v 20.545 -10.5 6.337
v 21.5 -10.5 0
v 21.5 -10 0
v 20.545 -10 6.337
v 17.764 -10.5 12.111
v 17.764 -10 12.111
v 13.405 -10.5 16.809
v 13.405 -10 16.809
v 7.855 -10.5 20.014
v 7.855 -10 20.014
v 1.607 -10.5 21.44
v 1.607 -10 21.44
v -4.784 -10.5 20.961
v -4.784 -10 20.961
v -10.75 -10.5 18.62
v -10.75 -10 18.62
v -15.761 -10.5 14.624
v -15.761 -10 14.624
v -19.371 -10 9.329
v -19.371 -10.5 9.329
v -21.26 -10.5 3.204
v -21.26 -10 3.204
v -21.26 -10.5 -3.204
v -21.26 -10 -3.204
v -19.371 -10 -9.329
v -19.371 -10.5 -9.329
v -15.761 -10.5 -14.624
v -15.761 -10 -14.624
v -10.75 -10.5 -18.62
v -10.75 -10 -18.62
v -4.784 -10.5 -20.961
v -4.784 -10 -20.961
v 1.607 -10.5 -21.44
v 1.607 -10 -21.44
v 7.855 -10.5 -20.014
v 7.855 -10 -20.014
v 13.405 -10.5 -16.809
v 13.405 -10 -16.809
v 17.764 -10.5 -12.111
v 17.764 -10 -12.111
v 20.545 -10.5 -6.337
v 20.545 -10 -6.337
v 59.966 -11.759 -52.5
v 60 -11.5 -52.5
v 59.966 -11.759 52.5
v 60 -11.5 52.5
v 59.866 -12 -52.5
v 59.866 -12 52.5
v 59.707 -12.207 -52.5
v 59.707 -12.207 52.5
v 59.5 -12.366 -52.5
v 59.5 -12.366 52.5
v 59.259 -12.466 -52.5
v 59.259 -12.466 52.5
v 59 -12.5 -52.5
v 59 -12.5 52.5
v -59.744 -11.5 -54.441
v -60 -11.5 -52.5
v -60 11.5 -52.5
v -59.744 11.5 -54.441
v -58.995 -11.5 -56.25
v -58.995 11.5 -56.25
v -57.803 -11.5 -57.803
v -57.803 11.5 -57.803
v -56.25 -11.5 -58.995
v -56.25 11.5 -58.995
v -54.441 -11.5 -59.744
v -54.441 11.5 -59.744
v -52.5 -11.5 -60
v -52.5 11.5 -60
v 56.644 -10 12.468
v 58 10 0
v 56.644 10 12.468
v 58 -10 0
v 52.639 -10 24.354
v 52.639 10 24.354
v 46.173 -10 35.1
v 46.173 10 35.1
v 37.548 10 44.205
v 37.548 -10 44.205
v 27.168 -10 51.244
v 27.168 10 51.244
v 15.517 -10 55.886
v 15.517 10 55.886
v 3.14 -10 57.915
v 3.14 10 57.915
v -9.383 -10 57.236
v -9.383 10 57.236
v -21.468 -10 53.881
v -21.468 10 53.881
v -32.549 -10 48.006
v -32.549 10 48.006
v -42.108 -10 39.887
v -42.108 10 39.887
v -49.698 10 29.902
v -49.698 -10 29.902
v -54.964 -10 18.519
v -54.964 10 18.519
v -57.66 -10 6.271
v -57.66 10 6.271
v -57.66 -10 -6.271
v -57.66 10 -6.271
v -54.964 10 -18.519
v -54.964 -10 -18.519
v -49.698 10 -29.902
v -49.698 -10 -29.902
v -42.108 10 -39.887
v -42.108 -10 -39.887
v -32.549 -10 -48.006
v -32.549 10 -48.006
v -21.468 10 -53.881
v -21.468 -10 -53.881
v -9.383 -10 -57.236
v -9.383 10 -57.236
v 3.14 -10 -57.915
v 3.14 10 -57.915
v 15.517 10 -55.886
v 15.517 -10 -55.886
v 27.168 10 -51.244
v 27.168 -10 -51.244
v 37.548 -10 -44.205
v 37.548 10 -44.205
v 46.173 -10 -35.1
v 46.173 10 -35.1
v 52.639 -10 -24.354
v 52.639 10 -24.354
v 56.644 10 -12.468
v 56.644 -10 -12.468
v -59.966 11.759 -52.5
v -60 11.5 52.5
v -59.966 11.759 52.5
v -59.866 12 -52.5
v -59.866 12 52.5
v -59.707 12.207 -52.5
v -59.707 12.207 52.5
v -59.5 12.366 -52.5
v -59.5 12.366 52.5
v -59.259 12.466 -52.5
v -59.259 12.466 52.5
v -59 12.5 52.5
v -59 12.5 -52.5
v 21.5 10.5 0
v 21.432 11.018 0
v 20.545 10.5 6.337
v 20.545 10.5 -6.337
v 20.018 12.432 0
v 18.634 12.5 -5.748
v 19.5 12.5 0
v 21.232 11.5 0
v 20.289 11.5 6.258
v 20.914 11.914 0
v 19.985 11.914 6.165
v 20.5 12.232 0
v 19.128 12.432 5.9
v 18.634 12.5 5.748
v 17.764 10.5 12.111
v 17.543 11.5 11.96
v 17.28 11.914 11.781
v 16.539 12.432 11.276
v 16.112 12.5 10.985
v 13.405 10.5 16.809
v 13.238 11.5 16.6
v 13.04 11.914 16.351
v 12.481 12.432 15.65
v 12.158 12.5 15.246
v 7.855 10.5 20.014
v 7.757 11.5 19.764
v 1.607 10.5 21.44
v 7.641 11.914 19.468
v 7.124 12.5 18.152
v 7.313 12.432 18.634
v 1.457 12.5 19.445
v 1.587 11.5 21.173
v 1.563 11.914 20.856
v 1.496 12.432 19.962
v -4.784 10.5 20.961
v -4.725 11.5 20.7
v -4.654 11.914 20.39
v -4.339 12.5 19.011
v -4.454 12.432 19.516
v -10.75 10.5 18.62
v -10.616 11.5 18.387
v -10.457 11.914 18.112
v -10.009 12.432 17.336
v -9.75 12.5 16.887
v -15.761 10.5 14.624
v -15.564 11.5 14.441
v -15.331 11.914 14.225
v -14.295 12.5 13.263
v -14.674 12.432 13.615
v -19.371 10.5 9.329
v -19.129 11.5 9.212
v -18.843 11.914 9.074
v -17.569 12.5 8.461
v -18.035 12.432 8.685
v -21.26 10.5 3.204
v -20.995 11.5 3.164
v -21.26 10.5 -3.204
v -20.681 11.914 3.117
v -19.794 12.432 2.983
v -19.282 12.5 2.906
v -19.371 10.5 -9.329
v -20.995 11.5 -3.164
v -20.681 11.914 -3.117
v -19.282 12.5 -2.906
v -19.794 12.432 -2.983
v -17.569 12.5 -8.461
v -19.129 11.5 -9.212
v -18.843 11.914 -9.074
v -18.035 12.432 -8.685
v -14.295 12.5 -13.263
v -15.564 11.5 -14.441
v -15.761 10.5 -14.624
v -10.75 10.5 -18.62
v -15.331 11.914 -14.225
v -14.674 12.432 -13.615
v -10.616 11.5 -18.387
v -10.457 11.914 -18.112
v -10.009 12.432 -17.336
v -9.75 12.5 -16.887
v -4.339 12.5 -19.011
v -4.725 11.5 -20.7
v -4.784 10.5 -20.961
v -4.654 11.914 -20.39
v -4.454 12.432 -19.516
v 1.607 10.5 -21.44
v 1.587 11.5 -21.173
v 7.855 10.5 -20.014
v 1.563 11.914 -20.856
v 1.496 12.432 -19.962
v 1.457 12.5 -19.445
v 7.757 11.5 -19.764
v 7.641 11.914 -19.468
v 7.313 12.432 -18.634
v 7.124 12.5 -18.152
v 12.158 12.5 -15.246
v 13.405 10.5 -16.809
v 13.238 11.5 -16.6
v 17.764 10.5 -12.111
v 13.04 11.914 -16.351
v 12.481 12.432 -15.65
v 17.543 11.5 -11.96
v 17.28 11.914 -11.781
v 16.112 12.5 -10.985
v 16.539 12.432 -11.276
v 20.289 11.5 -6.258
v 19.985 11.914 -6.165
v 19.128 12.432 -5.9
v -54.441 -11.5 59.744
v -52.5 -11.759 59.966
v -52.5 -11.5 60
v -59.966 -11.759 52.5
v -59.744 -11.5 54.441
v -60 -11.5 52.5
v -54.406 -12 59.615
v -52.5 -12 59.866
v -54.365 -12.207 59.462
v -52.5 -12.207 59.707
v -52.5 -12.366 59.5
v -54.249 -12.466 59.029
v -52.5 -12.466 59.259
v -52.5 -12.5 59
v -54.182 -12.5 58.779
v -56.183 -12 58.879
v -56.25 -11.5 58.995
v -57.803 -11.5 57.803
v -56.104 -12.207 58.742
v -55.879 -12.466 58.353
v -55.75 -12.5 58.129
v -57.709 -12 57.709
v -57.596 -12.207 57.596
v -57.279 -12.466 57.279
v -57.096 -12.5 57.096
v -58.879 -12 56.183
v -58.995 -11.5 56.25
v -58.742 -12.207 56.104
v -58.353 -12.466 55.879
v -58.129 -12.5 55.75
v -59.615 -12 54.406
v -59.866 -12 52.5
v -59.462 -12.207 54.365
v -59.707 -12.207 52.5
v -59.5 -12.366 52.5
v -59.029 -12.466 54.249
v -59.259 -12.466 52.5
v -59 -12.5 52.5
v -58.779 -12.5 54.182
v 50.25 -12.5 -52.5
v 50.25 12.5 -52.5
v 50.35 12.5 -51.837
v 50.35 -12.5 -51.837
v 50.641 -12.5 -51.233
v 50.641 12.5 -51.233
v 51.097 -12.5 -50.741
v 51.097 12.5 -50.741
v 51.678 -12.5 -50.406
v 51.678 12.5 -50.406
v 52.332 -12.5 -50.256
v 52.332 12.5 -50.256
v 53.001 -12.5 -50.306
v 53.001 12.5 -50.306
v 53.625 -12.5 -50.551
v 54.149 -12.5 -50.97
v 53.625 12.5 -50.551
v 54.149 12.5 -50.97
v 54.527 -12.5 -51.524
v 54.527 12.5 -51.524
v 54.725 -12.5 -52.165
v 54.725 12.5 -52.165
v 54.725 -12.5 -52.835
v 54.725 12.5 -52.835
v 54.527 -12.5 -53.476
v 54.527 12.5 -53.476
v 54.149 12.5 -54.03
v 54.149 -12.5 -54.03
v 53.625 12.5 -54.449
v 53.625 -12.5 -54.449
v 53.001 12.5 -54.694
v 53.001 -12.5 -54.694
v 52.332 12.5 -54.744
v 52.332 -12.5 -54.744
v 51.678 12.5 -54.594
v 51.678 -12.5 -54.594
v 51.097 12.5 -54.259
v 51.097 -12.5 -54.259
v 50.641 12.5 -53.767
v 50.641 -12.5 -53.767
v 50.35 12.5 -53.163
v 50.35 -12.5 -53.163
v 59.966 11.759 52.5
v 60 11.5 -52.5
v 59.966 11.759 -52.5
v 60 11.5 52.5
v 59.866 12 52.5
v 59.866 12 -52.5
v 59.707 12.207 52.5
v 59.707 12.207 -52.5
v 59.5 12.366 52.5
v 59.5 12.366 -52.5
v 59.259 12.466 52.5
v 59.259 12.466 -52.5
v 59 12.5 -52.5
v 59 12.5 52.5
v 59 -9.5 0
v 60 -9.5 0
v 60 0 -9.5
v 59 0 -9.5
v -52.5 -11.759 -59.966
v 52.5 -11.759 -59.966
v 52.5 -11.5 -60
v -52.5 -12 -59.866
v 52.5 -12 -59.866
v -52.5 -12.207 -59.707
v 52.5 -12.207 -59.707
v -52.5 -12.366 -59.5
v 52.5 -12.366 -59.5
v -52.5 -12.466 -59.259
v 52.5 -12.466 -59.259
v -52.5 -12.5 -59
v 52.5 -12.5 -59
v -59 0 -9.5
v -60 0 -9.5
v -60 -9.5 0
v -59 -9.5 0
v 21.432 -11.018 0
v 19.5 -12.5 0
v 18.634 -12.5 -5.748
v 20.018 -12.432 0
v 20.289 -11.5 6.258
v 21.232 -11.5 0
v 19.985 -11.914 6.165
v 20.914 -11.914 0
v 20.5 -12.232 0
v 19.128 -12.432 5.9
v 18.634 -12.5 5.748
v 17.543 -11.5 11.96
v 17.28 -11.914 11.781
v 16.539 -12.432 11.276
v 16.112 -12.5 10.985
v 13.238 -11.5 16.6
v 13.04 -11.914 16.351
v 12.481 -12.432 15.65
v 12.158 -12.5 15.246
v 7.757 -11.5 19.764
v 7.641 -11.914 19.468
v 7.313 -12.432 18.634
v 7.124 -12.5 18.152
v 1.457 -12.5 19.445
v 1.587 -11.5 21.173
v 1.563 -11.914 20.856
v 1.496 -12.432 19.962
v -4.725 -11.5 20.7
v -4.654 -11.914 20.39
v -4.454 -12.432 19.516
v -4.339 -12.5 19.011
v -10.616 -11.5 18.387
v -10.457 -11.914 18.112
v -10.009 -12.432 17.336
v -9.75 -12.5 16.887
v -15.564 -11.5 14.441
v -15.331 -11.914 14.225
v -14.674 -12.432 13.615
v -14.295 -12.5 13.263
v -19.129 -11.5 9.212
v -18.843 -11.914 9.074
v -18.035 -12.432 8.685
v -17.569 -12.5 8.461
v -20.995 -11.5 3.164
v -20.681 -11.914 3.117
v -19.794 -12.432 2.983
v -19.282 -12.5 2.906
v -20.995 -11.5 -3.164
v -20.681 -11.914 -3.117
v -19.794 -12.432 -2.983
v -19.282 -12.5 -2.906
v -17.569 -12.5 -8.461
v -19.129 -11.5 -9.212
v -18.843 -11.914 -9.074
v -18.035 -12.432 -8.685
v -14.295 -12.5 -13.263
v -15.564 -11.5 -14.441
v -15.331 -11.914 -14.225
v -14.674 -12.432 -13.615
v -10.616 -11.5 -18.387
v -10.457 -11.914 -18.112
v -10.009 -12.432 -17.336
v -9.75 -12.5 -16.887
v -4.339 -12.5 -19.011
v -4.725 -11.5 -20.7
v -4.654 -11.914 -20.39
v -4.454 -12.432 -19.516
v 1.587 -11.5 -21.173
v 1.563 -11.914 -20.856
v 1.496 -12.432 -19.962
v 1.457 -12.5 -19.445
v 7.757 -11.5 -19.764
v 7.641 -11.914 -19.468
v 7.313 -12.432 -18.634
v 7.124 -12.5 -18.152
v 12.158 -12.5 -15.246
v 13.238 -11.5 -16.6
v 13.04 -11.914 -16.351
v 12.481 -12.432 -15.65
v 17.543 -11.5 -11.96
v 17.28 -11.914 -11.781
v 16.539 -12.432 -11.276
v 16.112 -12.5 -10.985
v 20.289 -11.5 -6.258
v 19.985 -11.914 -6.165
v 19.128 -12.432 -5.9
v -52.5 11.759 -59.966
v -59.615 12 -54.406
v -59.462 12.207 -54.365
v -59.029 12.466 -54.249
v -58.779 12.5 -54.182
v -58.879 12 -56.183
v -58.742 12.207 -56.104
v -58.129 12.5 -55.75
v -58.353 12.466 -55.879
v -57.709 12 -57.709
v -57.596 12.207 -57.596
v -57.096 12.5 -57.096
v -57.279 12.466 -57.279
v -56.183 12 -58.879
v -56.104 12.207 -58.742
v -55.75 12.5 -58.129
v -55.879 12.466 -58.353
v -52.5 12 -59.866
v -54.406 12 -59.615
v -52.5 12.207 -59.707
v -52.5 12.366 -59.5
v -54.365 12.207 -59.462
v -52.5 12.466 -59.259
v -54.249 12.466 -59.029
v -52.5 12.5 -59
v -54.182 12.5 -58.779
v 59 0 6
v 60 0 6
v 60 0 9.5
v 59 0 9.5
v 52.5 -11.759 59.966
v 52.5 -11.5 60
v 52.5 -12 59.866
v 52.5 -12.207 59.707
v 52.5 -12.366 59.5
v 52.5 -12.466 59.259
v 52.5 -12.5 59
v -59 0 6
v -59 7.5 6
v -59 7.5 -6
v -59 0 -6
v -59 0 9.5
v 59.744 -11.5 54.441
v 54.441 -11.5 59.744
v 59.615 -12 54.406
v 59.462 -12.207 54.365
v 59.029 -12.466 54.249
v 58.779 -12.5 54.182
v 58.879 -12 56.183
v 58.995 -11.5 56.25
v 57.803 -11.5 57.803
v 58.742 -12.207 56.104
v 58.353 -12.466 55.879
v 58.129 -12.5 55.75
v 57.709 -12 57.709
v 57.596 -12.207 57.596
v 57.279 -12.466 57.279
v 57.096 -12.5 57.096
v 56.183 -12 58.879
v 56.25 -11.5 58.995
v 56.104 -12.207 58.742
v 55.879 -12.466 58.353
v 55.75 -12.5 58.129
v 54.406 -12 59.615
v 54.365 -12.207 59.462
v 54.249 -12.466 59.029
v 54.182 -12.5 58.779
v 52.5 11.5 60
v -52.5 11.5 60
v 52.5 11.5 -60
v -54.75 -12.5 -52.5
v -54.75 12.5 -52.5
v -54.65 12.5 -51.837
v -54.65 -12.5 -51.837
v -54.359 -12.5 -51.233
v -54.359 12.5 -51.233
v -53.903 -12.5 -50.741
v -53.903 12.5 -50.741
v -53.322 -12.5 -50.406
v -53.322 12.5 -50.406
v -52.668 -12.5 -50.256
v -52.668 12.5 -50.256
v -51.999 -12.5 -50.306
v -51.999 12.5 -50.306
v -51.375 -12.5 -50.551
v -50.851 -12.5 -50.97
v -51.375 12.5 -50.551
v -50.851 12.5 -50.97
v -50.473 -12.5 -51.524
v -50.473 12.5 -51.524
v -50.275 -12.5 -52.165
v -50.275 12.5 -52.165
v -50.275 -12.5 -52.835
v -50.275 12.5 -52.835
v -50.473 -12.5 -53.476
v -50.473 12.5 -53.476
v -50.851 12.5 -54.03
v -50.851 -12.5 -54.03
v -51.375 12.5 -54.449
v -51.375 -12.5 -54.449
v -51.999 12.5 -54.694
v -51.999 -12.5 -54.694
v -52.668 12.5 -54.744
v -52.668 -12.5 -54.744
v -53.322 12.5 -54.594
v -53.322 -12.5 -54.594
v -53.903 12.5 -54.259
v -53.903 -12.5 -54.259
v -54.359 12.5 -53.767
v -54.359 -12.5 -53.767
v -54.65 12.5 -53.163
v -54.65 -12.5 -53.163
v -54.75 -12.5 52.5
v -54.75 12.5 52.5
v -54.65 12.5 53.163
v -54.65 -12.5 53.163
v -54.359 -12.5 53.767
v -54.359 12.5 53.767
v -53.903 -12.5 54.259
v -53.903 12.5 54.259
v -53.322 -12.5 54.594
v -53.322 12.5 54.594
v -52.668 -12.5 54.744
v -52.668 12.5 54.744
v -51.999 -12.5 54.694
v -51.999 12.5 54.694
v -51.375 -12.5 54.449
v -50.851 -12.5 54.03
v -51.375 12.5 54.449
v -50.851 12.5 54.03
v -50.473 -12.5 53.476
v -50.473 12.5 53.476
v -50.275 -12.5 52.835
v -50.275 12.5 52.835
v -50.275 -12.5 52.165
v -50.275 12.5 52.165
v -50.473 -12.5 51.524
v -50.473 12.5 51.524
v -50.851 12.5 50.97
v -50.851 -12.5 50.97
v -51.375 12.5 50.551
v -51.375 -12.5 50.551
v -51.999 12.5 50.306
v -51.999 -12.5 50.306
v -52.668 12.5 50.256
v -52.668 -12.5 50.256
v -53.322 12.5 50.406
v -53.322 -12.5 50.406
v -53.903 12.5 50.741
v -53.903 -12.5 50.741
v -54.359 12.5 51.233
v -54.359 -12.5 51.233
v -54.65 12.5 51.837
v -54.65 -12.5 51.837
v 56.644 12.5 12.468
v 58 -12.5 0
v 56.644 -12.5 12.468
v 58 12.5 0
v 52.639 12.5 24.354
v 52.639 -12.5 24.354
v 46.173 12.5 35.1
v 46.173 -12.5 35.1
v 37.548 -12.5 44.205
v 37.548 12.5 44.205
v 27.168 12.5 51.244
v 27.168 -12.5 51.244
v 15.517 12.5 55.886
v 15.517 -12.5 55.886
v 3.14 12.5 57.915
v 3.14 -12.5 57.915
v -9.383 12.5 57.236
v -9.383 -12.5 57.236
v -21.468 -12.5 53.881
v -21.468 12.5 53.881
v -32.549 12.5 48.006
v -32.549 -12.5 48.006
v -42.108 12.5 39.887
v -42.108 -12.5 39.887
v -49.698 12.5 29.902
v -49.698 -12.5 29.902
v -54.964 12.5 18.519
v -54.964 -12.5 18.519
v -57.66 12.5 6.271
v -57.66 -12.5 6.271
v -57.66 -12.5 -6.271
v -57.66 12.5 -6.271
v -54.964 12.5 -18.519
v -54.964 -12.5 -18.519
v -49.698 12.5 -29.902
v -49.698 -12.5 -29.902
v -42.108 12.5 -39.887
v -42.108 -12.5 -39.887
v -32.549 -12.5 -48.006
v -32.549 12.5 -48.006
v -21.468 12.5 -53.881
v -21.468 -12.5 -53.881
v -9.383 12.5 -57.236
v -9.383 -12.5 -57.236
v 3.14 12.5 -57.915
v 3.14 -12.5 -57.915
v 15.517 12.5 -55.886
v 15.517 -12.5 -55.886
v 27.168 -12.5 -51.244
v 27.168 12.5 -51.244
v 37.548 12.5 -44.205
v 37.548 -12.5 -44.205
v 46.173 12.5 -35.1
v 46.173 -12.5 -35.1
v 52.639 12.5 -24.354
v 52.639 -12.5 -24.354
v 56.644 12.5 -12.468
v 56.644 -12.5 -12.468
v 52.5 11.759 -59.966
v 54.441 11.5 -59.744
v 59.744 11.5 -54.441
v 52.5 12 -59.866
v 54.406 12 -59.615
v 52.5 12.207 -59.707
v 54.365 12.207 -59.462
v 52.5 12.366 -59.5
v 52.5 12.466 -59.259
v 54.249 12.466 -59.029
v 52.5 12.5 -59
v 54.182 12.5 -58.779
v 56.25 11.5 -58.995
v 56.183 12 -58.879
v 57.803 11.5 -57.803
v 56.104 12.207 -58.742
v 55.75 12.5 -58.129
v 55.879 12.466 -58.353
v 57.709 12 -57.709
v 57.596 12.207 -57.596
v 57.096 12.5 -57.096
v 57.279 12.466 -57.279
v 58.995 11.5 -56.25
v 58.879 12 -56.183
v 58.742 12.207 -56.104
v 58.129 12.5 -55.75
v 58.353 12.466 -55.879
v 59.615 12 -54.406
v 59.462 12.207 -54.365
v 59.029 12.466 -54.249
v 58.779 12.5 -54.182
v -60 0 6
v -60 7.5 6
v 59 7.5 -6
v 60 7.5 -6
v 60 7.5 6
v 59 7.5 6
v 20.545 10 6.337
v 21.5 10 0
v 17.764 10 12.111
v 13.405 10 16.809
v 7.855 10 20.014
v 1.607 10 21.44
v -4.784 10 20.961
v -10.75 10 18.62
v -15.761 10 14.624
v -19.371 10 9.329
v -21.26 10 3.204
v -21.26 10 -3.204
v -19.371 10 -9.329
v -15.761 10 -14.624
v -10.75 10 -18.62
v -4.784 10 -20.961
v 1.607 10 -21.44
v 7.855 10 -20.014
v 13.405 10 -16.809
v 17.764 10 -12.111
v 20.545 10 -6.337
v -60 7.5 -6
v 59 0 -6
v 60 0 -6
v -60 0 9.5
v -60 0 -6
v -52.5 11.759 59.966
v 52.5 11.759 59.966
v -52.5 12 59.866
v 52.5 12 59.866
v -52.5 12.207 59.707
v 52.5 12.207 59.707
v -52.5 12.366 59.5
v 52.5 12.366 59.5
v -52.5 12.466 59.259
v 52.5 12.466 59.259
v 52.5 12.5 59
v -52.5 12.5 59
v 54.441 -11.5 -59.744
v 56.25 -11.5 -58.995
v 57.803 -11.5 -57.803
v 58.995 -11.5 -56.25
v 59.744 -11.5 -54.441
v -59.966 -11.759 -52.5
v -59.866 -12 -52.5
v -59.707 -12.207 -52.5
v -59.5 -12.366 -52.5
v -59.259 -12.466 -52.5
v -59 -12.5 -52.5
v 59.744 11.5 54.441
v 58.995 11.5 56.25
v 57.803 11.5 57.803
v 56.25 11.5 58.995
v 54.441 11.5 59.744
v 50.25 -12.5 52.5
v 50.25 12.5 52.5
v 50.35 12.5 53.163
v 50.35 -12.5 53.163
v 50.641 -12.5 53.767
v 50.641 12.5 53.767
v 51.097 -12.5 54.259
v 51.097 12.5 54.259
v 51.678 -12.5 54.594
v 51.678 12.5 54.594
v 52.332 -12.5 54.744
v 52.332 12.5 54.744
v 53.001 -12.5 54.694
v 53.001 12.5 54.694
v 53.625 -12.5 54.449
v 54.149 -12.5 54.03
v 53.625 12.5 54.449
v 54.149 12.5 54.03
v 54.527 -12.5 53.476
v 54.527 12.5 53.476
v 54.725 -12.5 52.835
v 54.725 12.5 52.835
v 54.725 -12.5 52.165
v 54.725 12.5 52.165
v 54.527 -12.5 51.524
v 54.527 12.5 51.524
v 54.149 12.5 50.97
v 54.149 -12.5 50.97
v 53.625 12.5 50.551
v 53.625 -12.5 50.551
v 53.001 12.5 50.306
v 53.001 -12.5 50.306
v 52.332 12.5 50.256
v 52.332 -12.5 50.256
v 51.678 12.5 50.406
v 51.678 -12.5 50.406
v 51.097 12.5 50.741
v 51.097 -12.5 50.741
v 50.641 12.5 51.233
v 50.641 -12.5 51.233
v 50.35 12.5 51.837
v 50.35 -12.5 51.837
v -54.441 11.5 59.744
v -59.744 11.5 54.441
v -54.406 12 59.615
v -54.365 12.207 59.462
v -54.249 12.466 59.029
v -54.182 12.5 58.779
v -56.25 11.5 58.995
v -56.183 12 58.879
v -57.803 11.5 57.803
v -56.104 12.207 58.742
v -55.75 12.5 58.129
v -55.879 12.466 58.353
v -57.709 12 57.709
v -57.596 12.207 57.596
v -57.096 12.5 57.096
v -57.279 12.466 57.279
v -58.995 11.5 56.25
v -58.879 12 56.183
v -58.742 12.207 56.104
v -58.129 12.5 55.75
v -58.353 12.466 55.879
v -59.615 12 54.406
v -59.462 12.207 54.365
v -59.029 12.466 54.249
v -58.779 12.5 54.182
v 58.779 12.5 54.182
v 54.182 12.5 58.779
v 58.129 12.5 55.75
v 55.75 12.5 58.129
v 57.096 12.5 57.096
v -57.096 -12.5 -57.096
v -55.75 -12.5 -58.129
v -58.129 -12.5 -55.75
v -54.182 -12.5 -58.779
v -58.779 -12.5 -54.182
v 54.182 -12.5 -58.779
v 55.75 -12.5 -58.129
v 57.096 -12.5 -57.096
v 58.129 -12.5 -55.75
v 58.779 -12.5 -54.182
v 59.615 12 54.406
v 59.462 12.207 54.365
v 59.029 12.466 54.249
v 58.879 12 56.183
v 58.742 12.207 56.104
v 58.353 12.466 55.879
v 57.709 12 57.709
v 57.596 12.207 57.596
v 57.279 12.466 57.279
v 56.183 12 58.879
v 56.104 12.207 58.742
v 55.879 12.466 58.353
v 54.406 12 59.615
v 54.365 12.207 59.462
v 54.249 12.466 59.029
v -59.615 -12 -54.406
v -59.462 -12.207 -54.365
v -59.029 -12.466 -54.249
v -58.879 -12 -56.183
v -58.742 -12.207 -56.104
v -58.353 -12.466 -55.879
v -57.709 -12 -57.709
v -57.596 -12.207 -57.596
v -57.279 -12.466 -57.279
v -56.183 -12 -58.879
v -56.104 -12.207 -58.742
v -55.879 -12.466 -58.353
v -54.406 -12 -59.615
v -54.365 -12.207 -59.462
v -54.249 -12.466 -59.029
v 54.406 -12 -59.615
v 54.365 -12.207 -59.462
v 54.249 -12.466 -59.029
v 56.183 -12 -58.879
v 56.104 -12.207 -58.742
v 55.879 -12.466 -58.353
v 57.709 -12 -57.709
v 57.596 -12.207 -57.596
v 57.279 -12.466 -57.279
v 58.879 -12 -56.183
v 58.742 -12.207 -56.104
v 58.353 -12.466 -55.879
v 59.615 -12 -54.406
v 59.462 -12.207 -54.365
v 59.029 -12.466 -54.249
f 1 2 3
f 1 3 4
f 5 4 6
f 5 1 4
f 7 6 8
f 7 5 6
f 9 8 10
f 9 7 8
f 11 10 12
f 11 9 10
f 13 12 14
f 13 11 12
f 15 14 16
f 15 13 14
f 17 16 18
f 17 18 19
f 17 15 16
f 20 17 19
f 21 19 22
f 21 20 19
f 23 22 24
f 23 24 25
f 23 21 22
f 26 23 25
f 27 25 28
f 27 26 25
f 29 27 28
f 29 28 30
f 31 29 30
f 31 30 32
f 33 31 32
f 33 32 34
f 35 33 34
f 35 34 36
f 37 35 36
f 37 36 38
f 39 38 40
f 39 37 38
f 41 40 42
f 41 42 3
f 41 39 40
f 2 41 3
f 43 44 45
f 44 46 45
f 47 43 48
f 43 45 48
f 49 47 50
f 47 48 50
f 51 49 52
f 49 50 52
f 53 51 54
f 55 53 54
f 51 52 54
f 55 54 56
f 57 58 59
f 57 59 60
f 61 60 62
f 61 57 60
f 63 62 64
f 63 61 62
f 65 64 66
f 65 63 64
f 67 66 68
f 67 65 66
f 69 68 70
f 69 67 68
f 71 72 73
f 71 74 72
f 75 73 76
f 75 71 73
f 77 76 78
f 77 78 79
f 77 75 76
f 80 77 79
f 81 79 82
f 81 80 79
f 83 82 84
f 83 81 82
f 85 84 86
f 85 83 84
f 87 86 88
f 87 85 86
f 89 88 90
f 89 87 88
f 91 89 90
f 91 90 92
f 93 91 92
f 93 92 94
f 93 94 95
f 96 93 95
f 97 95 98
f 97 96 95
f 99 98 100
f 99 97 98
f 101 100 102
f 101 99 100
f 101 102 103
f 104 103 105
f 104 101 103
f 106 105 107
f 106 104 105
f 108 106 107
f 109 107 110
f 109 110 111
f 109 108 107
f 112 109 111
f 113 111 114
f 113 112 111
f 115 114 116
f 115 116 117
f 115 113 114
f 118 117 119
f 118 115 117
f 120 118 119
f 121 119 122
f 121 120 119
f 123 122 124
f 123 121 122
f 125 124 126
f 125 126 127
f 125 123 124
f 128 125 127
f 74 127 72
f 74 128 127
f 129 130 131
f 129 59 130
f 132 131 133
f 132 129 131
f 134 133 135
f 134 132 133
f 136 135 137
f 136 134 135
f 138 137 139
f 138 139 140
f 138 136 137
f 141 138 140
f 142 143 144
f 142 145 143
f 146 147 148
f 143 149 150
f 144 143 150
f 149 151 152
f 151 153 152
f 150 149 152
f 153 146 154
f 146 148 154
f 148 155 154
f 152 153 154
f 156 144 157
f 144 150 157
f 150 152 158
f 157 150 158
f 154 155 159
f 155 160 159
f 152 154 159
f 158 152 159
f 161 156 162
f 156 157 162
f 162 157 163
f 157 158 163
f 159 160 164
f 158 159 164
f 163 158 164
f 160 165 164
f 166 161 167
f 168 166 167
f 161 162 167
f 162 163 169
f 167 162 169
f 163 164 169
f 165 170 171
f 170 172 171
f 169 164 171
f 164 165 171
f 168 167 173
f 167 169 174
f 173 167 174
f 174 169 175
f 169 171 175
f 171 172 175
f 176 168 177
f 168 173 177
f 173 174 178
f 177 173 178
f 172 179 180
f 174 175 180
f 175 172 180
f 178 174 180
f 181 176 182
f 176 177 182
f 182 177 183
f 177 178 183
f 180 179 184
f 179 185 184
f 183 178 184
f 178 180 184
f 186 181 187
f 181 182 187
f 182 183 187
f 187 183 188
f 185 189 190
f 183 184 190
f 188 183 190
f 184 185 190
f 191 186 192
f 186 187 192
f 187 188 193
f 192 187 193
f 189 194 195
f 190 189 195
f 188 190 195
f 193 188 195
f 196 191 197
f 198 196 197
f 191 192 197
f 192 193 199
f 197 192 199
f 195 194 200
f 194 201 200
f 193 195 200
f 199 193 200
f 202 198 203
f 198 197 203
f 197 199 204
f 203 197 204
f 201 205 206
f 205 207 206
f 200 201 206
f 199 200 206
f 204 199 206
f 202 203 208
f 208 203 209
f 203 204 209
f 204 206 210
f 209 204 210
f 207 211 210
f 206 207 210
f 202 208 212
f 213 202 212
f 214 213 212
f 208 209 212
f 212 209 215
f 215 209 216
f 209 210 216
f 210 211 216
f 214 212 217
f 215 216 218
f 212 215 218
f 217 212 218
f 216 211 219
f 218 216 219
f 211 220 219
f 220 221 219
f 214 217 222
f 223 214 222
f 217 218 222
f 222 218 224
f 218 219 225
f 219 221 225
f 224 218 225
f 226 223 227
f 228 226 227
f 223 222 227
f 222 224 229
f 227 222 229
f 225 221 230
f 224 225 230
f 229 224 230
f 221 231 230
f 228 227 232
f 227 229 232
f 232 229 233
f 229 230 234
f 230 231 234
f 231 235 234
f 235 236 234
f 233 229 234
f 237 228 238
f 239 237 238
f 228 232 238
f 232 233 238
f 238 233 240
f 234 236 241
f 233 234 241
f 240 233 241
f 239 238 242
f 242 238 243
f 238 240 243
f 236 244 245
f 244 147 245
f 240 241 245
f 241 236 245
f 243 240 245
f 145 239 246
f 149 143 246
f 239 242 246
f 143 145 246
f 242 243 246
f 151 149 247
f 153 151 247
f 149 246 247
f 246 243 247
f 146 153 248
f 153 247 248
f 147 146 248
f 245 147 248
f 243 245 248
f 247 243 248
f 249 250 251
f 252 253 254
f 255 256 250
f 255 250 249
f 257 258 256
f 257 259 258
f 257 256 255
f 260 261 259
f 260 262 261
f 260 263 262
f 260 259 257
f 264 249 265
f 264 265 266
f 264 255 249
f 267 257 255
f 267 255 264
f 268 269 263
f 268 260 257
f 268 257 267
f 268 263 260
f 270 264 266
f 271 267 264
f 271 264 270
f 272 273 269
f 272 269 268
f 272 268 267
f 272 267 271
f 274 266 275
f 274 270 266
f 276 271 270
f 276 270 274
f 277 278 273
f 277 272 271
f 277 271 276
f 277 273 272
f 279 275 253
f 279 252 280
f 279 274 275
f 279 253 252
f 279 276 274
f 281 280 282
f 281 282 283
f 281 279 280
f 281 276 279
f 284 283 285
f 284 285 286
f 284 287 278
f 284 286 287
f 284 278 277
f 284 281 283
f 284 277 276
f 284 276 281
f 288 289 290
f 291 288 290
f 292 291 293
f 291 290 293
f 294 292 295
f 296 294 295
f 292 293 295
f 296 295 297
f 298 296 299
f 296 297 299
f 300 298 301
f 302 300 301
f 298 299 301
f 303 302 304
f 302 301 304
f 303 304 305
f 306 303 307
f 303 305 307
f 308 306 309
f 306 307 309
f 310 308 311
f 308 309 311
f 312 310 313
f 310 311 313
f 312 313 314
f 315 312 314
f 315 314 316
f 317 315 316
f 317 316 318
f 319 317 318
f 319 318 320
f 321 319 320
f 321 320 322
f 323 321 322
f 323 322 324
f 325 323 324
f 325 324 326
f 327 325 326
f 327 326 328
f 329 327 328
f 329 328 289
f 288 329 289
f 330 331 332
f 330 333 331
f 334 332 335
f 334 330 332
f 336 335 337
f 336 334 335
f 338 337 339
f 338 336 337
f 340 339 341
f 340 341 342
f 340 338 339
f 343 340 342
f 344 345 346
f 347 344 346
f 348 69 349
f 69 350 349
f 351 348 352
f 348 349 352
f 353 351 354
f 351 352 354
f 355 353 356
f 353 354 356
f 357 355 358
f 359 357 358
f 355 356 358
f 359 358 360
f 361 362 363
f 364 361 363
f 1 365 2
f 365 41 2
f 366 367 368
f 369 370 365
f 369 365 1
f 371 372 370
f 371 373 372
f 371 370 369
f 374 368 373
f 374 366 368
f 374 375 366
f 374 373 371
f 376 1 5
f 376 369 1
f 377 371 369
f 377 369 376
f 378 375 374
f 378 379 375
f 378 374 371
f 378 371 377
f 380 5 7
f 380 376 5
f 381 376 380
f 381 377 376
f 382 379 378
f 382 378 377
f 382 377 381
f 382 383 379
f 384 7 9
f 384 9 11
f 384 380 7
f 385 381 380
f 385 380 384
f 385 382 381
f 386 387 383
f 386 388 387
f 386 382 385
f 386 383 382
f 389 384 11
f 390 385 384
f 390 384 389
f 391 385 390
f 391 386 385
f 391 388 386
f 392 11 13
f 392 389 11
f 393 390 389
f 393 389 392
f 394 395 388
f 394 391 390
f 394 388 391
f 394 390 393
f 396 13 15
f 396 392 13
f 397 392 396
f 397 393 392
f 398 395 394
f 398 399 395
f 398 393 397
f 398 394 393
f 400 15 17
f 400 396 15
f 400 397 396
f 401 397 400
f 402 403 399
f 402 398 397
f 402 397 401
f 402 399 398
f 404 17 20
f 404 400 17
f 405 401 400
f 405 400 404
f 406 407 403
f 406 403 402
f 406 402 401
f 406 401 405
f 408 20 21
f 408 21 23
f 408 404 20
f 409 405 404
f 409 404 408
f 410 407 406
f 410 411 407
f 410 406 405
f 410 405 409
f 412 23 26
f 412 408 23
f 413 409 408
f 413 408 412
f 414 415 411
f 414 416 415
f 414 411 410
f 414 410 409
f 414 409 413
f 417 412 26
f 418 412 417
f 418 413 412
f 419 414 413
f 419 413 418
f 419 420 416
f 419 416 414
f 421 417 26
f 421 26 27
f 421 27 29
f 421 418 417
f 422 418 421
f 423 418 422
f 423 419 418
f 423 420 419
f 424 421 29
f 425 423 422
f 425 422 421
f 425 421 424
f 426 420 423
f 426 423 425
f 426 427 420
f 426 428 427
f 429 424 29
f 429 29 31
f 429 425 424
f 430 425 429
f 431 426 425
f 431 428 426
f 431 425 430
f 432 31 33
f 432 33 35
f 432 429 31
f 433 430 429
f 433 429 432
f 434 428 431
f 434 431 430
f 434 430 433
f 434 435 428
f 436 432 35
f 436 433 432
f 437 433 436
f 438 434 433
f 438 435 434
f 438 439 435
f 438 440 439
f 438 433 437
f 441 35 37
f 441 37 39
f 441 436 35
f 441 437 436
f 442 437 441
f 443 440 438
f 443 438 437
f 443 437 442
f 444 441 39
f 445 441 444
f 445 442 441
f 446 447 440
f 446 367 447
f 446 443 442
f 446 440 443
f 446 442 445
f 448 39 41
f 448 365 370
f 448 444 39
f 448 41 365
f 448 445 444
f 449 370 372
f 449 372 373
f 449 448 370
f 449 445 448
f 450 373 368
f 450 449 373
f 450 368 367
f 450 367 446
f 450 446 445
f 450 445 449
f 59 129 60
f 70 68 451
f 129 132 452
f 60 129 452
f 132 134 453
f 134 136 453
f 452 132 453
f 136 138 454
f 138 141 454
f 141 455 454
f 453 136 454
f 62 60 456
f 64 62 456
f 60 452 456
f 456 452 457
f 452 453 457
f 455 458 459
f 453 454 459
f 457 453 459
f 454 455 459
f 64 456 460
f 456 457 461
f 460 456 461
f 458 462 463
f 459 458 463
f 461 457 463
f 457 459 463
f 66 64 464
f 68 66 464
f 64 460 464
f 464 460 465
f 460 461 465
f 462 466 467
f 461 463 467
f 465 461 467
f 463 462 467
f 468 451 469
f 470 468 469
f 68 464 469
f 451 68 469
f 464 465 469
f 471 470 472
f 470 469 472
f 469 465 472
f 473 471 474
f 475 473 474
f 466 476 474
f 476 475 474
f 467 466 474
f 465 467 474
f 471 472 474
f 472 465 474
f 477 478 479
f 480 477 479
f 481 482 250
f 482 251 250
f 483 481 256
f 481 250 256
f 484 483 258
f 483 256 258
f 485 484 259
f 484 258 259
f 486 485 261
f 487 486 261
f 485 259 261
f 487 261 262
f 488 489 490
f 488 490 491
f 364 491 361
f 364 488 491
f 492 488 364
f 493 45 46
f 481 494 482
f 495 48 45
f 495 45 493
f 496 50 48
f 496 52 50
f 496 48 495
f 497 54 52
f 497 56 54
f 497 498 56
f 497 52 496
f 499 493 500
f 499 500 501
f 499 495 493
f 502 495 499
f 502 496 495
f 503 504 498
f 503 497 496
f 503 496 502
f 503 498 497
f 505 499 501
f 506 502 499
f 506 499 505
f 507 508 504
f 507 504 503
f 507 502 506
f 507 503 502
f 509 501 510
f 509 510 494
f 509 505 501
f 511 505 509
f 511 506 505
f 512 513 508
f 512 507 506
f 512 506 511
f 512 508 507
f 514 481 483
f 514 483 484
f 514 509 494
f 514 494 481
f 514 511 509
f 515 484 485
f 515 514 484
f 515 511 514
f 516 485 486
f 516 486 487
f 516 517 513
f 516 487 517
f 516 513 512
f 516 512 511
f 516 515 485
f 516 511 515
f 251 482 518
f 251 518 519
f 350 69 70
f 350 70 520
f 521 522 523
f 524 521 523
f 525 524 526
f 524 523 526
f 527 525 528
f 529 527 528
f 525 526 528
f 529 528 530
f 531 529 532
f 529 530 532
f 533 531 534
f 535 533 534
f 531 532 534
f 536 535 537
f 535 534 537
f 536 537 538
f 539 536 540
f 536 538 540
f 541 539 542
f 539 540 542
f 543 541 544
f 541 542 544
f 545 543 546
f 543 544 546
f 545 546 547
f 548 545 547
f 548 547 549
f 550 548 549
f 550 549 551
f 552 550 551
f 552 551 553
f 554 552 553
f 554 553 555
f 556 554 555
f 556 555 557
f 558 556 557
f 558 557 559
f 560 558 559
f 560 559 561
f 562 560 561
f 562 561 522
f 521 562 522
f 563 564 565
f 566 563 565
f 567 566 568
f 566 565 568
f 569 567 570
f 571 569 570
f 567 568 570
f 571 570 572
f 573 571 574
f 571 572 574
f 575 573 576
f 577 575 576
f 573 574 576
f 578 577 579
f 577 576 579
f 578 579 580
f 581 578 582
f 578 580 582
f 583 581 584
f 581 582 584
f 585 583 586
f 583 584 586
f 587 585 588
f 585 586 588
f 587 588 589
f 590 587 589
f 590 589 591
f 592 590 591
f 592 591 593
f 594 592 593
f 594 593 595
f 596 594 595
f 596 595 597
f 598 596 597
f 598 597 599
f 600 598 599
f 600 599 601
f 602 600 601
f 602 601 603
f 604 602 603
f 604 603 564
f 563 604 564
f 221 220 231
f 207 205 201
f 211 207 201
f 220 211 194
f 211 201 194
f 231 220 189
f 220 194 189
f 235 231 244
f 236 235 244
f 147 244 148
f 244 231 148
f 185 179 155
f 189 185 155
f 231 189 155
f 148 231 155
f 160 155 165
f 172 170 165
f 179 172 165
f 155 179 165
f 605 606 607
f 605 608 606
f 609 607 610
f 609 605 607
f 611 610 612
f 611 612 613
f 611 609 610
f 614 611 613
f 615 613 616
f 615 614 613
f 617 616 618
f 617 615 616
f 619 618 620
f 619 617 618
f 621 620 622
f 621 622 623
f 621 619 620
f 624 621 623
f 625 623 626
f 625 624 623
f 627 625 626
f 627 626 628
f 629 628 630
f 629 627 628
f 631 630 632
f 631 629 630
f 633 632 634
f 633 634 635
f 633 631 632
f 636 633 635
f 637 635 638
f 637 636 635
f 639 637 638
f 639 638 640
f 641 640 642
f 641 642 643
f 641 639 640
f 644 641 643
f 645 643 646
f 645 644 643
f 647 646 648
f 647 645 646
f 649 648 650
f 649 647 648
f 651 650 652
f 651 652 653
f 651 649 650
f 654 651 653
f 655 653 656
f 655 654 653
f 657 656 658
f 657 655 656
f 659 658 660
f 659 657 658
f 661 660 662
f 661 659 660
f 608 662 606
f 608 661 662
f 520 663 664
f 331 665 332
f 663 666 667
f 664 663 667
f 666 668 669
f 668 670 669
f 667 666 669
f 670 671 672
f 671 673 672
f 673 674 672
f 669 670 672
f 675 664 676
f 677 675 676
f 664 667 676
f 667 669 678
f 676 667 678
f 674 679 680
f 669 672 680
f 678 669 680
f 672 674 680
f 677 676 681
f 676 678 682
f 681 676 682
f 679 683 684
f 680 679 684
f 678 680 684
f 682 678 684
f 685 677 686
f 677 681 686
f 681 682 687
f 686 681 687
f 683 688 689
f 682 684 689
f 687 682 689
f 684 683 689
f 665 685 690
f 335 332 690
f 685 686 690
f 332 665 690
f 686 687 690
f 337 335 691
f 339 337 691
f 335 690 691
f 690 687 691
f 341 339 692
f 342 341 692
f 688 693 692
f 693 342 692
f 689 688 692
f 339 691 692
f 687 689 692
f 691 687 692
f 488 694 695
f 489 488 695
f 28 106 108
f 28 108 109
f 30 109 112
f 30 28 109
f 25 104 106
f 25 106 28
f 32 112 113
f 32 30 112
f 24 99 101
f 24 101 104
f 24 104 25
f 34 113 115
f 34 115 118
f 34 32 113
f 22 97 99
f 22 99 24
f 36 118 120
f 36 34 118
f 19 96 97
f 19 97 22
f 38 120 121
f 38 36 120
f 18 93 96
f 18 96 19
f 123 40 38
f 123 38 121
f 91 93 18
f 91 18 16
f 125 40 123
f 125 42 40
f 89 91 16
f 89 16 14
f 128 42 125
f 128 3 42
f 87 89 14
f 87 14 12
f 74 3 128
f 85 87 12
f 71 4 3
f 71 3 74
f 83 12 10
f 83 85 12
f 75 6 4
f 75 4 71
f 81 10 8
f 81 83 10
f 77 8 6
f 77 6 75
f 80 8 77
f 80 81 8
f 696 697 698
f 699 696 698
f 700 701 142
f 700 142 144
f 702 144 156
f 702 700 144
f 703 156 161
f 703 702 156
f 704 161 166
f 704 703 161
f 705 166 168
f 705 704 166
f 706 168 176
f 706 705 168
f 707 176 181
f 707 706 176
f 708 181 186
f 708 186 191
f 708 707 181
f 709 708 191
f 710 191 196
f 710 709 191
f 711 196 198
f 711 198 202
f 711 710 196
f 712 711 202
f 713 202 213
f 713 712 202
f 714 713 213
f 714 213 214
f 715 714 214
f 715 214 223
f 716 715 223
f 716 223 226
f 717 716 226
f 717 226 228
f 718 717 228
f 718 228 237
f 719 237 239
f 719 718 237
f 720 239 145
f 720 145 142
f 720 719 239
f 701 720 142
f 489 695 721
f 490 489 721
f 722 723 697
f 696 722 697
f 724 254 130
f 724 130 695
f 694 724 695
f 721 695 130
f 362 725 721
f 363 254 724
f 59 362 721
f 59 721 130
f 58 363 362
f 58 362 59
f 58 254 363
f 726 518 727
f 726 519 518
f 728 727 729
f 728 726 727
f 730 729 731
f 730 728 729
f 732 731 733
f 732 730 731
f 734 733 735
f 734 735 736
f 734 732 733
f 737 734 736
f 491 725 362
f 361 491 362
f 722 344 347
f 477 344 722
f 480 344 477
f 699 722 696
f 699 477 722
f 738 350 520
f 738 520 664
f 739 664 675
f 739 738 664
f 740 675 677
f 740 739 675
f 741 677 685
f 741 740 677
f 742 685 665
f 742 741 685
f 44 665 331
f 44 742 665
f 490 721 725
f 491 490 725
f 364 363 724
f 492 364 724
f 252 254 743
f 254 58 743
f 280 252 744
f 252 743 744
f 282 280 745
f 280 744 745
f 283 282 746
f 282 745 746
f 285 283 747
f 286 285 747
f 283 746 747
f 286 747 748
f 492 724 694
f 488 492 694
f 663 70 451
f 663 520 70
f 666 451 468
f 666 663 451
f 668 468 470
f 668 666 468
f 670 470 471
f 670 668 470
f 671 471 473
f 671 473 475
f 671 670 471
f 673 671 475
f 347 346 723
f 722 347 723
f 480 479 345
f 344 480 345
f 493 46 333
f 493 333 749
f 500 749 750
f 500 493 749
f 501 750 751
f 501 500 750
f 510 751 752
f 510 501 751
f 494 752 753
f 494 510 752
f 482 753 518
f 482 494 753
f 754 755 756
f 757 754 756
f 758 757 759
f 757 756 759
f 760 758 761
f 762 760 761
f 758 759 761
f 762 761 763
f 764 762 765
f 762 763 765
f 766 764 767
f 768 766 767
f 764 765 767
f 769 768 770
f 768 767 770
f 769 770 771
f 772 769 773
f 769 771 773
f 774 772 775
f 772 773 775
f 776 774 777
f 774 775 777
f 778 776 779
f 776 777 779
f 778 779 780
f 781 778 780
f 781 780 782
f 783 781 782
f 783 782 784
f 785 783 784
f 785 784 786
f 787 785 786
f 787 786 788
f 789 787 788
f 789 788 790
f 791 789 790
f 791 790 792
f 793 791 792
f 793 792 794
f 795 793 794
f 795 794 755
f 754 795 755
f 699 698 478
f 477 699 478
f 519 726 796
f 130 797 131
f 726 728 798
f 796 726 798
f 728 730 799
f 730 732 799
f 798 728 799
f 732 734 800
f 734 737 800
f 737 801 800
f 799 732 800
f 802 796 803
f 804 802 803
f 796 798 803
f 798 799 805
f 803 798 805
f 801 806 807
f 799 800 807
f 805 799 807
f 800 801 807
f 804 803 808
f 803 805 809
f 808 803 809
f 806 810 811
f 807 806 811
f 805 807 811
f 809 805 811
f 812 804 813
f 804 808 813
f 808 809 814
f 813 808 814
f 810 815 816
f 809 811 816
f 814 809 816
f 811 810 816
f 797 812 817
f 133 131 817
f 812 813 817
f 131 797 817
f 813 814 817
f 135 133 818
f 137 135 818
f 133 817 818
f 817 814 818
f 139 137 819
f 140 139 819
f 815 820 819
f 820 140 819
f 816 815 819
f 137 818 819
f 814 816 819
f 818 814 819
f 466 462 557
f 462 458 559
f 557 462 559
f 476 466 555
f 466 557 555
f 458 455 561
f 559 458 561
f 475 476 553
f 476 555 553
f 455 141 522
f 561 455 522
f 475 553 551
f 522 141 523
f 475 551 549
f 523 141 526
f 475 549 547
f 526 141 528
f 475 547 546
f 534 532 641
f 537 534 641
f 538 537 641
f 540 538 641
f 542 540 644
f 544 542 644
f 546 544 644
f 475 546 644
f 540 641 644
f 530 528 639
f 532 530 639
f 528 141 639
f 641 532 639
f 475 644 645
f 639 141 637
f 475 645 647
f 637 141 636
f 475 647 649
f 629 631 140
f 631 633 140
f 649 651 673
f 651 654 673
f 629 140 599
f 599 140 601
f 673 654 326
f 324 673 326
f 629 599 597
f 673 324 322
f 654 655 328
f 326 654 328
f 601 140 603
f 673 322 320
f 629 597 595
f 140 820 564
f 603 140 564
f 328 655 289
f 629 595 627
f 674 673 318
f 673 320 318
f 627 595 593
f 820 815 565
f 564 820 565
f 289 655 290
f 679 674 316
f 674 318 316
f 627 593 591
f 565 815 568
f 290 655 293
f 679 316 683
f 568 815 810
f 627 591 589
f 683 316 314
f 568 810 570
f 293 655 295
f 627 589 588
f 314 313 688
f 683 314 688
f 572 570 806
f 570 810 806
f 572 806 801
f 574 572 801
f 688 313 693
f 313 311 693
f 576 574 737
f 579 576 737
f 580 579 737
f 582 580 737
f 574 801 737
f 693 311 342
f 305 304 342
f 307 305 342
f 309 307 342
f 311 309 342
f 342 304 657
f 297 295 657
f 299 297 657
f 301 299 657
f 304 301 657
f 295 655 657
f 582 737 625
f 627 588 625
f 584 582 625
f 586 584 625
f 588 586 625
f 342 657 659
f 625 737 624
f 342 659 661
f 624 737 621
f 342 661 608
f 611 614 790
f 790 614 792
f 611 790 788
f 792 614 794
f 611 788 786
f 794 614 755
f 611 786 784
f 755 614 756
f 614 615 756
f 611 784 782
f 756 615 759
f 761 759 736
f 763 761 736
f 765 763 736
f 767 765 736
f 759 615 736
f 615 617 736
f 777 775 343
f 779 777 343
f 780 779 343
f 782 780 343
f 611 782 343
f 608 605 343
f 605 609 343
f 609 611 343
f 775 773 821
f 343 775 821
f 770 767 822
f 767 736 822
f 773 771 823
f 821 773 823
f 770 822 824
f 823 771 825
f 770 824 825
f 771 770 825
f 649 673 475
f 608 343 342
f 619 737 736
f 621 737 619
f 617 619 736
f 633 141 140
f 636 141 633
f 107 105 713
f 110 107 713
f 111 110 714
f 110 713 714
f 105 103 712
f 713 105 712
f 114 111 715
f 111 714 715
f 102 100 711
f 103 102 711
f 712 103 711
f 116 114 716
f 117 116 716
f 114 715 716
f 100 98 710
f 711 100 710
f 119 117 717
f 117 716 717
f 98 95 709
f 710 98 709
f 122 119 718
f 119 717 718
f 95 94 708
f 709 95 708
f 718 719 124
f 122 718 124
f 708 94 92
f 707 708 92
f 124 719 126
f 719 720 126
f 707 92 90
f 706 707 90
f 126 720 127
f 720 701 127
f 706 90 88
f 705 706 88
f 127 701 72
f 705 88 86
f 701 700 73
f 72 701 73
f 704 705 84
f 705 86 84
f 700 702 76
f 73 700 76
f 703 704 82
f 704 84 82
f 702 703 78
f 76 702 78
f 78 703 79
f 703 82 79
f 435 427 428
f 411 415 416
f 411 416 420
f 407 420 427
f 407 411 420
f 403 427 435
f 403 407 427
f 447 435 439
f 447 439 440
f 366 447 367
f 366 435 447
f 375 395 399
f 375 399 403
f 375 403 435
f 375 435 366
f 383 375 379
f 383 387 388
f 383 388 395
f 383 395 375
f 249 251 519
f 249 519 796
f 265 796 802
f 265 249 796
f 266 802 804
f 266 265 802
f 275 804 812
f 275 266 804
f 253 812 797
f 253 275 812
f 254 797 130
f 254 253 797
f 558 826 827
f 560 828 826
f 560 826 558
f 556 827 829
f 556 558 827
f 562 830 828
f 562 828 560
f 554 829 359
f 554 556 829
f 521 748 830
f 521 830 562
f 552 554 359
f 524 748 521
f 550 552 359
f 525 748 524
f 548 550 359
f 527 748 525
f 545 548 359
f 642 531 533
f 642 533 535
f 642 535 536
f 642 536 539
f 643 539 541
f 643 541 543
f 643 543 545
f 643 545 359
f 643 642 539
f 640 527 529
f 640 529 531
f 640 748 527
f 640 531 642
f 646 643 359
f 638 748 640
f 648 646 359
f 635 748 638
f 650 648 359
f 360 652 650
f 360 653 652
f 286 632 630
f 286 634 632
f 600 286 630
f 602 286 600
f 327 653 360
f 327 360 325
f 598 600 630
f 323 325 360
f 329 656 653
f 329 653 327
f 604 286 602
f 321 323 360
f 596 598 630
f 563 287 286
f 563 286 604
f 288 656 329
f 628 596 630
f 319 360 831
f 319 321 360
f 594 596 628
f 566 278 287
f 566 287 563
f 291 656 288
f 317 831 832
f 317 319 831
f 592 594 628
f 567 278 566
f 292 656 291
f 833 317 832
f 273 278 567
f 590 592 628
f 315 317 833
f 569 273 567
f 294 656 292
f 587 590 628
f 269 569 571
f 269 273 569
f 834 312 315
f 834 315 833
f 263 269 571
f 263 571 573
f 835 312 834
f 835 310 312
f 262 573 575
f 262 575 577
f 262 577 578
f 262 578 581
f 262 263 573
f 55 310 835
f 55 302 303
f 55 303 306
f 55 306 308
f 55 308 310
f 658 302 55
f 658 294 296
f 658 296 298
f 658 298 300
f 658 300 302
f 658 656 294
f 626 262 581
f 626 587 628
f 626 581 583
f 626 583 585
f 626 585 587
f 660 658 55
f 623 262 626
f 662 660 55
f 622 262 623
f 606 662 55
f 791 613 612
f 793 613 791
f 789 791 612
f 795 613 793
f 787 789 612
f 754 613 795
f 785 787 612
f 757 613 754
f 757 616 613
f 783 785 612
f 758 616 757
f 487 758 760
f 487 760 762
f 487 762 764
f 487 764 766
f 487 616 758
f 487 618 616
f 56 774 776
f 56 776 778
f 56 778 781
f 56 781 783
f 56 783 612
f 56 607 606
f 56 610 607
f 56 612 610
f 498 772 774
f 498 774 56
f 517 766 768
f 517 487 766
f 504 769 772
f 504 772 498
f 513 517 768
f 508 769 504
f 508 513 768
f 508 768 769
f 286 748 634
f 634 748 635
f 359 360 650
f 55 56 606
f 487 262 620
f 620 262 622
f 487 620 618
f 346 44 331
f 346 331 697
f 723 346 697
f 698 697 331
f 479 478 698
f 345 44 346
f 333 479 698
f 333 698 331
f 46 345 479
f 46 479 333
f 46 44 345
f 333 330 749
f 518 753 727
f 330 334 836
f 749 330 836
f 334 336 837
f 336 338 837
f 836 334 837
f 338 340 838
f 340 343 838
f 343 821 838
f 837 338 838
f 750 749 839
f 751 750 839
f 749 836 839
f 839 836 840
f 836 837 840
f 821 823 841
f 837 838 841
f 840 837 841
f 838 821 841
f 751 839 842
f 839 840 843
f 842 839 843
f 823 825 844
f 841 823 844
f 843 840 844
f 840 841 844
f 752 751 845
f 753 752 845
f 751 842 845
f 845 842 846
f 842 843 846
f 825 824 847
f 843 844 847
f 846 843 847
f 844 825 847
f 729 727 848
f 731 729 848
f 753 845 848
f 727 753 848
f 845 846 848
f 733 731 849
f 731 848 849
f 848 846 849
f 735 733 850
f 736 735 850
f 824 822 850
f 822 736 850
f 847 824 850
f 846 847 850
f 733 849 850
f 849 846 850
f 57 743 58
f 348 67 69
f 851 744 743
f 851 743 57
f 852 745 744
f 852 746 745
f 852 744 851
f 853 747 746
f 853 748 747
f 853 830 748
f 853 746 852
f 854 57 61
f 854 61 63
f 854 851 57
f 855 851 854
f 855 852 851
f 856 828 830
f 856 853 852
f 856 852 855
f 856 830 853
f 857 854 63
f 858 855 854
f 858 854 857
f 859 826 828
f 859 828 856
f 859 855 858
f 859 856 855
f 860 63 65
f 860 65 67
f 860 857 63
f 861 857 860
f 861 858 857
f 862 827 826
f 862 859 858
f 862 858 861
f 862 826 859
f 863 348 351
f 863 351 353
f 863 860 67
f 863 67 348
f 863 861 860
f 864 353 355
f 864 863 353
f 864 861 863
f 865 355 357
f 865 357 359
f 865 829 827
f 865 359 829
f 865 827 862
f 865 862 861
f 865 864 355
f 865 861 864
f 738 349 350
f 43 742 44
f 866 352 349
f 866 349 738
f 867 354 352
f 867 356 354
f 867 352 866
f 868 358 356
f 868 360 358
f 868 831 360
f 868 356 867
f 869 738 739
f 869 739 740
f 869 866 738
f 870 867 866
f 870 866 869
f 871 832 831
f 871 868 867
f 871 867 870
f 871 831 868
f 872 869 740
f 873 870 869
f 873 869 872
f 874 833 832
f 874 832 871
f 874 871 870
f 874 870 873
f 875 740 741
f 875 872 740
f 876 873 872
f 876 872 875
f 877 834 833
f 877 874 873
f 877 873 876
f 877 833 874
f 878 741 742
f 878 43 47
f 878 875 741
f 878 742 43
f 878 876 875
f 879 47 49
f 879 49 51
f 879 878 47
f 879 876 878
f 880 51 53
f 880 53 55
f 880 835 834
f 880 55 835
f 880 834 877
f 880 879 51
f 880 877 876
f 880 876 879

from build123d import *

# Parameters (mm, degrees)
F0_R      = 58
F1_DEPTH  = 12.5
F0_R_2    = 21.5
F2_DEPTH  = 10
F3_R      = 2
F4_R      = 1
F6_D      = 4.5
F8_DEPTH  = 1
F10_DEPTH = 1


with BuildPart() as f1:
    # F0 (on Front) → F1 (new body, symmetric)
    with BuildSketch(Plane.XZ):
        with BuildLine():
            Line((52.5, 60), (-52.5, 60))
            ThreePointArc((-52.5, 60), (-57.8033008589, 57.8033008589), (-60, 52.5))
            Line((-60, 52.5), (-60, -52.5))
            ThreePointArc((-60, -52.5), (-57.8033008589, -57.8033008589), (-52.5, -60))
            Line((-52.5, -60), (52.5, -60))
            ThreePointArc((52.5, -60), (57.8033008589, -57.8033008589), (60, -52.5))
            Line((60, -52.5), (60, 52.5))
            ThreePointArc((60, 52.5), (57.8033008589, 57.8033008589), (52.5, 60))
        make_face()
        Circle(F0_R, mode=Mode.SUBTRACT)
    extrude(amount=F1_DEPTH, both=True)

    # F4
    f4_edges = [f1.edges().sort_by_distance(p)[0] for p in [
        (-60, -12.5, 0),
        (-57.803301, -12.5, -57.803301),
        (0, -12.5, -60),
        (57.803301, -12.5, -57.803301),
        (60, -12.5, 0),
        (57.803301, -12.5, 57.803301),
        (0, -12.5, 60),
        (-57.803301, -12.5, 57.803301),
        (-57.803301, 12.5, -57.803301),
        (0, 12.5, -60),
        (57.803301, 12.5, -57.803301),
        (-60, 12.5, 0),
        (60, 12.5, 0),
        (57.803301, 12.5, 57.803301),
        (0, 12.5, 60),
        (-57.803301, 12.5, 57.803301),
    ]]
    fillet(f4_edges, radius=F4_R)

    # F6 (through all)
    with Locations(Plane.XZ.offset(12.5)):
        with Locations((-52.5, 52.5), (52.5, 52.5), (52.5, -52.5), (-52.5, -52.5)):
            Hole(F6_D / 2)

    # F7 (on face) → F8 (cut)
    with BuildSketch(Plane(origin=(-60, 0, 0), x_dir=(0, -1, 0), z_dir=(-1, 0, 0))):
        Polygon((0, -9.5), (9.5, 0), (0, 9.5), (0, 6), (-7.5, 6), (-7.5, 0), (-7.5, -6), (0, -6), align=None)
    extrude(amount=-F8_DEPTH, mode=Mode.SUBTRACT)

    # F9 (on face) → F10 (cut)
    with BuildSketch(Plane.YZ.offset(60)):
        Polygon((0, 9.5), (-9.5, 0), (0, -9.5), (0, -6), (7.5, -6), (7.5, 0), (7.5, 6), (0, 6), align=None)
    extrude(amount=-F10_DEPTH, mode=Mode.SUBTRACT)


with BuildPart() as f1b:
    # F0 (on Front) → F1, piece 2 (new body, symmetric)
    with BuildSketch(Plane.XZ):
        Circle(F0_R_2)
    extrude(amount=F1_DEPTH, both=True)

    # F0 (on Front) → F2 (join, symmetric)
    with BuildSketch(Plane.XZ):
        Circle(F0_R)
        Circle(F0_R_2, mode=Mode.SUBTRACT)
    extrude(amount=F2_DEPTH, both=True)

    # F3
    f3_edges = [f1b.edges().sort_by_distance(p)[0] for p in [
        (-21.5, -12.5, 0),
        (-21.5, 12.5, 0),
    ]]
    fillet(f3_edges, radius=F3_R)


solid = Compound([f1.part, f1b.part])
